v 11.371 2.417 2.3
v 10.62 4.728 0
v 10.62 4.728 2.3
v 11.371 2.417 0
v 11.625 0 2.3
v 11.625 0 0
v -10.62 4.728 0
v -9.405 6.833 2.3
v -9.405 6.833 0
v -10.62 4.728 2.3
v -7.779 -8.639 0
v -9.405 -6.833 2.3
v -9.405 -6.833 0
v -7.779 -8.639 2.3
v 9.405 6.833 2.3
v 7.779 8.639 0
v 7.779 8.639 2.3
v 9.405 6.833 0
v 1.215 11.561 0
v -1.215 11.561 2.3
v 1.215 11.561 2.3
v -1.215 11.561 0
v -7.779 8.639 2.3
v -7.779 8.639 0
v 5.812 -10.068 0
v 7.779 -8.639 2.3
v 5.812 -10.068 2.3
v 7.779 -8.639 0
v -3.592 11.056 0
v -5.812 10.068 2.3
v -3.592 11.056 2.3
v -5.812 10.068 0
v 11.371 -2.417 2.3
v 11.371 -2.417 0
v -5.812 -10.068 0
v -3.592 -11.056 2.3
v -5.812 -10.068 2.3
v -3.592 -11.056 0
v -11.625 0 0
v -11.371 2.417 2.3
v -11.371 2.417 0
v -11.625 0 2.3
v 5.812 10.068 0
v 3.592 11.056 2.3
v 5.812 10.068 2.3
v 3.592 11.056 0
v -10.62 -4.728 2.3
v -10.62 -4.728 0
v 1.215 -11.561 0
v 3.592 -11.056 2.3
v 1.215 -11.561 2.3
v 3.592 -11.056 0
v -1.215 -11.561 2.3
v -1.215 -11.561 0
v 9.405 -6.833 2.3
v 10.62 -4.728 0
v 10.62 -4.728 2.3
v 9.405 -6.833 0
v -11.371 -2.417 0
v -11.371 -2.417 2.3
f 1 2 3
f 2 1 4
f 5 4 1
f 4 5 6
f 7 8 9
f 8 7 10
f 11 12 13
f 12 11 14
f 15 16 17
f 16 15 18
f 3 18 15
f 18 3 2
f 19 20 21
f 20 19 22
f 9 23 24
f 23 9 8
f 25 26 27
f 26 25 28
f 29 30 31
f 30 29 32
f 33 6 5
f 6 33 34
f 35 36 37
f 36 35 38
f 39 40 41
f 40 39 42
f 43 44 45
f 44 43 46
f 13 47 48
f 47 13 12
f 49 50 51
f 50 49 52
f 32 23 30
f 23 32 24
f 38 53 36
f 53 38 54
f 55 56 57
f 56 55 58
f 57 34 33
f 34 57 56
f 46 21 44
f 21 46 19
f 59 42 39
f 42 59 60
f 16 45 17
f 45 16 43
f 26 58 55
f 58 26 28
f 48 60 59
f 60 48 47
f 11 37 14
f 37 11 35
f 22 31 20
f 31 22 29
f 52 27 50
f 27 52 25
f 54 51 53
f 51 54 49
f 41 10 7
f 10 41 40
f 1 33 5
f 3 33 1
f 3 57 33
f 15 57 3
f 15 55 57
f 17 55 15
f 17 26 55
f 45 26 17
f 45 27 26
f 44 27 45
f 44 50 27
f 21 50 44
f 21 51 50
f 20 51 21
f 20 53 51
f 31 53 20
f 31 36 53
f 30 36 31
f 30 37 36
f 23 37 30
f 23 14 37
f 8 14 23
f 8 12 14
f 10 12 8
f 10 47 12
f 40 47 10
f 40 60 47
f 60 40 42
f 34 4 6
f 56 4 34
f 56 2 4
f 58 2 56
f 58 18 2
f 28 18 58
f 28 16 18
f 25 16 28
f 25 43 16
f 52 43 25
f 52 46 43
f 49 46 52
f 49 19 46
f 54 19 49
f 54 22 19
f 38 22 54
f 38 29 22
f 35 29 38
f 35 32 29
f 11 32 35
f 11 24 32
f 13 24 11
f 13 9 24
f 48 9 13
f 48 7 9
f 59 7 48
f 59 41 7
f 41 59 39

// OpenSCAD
// Fusito v2.0
// http://clonewars.es
//
// based on William Adams' excellent ball-and-socket code
use <WriteSVG.scad>







difference(){
	cylinder(r=23.25/2, h=2.3, $fn=30);
    writecylinder("Clone Wars  GORT",[0,0,0],23/2,2.06,face="top" );
}
